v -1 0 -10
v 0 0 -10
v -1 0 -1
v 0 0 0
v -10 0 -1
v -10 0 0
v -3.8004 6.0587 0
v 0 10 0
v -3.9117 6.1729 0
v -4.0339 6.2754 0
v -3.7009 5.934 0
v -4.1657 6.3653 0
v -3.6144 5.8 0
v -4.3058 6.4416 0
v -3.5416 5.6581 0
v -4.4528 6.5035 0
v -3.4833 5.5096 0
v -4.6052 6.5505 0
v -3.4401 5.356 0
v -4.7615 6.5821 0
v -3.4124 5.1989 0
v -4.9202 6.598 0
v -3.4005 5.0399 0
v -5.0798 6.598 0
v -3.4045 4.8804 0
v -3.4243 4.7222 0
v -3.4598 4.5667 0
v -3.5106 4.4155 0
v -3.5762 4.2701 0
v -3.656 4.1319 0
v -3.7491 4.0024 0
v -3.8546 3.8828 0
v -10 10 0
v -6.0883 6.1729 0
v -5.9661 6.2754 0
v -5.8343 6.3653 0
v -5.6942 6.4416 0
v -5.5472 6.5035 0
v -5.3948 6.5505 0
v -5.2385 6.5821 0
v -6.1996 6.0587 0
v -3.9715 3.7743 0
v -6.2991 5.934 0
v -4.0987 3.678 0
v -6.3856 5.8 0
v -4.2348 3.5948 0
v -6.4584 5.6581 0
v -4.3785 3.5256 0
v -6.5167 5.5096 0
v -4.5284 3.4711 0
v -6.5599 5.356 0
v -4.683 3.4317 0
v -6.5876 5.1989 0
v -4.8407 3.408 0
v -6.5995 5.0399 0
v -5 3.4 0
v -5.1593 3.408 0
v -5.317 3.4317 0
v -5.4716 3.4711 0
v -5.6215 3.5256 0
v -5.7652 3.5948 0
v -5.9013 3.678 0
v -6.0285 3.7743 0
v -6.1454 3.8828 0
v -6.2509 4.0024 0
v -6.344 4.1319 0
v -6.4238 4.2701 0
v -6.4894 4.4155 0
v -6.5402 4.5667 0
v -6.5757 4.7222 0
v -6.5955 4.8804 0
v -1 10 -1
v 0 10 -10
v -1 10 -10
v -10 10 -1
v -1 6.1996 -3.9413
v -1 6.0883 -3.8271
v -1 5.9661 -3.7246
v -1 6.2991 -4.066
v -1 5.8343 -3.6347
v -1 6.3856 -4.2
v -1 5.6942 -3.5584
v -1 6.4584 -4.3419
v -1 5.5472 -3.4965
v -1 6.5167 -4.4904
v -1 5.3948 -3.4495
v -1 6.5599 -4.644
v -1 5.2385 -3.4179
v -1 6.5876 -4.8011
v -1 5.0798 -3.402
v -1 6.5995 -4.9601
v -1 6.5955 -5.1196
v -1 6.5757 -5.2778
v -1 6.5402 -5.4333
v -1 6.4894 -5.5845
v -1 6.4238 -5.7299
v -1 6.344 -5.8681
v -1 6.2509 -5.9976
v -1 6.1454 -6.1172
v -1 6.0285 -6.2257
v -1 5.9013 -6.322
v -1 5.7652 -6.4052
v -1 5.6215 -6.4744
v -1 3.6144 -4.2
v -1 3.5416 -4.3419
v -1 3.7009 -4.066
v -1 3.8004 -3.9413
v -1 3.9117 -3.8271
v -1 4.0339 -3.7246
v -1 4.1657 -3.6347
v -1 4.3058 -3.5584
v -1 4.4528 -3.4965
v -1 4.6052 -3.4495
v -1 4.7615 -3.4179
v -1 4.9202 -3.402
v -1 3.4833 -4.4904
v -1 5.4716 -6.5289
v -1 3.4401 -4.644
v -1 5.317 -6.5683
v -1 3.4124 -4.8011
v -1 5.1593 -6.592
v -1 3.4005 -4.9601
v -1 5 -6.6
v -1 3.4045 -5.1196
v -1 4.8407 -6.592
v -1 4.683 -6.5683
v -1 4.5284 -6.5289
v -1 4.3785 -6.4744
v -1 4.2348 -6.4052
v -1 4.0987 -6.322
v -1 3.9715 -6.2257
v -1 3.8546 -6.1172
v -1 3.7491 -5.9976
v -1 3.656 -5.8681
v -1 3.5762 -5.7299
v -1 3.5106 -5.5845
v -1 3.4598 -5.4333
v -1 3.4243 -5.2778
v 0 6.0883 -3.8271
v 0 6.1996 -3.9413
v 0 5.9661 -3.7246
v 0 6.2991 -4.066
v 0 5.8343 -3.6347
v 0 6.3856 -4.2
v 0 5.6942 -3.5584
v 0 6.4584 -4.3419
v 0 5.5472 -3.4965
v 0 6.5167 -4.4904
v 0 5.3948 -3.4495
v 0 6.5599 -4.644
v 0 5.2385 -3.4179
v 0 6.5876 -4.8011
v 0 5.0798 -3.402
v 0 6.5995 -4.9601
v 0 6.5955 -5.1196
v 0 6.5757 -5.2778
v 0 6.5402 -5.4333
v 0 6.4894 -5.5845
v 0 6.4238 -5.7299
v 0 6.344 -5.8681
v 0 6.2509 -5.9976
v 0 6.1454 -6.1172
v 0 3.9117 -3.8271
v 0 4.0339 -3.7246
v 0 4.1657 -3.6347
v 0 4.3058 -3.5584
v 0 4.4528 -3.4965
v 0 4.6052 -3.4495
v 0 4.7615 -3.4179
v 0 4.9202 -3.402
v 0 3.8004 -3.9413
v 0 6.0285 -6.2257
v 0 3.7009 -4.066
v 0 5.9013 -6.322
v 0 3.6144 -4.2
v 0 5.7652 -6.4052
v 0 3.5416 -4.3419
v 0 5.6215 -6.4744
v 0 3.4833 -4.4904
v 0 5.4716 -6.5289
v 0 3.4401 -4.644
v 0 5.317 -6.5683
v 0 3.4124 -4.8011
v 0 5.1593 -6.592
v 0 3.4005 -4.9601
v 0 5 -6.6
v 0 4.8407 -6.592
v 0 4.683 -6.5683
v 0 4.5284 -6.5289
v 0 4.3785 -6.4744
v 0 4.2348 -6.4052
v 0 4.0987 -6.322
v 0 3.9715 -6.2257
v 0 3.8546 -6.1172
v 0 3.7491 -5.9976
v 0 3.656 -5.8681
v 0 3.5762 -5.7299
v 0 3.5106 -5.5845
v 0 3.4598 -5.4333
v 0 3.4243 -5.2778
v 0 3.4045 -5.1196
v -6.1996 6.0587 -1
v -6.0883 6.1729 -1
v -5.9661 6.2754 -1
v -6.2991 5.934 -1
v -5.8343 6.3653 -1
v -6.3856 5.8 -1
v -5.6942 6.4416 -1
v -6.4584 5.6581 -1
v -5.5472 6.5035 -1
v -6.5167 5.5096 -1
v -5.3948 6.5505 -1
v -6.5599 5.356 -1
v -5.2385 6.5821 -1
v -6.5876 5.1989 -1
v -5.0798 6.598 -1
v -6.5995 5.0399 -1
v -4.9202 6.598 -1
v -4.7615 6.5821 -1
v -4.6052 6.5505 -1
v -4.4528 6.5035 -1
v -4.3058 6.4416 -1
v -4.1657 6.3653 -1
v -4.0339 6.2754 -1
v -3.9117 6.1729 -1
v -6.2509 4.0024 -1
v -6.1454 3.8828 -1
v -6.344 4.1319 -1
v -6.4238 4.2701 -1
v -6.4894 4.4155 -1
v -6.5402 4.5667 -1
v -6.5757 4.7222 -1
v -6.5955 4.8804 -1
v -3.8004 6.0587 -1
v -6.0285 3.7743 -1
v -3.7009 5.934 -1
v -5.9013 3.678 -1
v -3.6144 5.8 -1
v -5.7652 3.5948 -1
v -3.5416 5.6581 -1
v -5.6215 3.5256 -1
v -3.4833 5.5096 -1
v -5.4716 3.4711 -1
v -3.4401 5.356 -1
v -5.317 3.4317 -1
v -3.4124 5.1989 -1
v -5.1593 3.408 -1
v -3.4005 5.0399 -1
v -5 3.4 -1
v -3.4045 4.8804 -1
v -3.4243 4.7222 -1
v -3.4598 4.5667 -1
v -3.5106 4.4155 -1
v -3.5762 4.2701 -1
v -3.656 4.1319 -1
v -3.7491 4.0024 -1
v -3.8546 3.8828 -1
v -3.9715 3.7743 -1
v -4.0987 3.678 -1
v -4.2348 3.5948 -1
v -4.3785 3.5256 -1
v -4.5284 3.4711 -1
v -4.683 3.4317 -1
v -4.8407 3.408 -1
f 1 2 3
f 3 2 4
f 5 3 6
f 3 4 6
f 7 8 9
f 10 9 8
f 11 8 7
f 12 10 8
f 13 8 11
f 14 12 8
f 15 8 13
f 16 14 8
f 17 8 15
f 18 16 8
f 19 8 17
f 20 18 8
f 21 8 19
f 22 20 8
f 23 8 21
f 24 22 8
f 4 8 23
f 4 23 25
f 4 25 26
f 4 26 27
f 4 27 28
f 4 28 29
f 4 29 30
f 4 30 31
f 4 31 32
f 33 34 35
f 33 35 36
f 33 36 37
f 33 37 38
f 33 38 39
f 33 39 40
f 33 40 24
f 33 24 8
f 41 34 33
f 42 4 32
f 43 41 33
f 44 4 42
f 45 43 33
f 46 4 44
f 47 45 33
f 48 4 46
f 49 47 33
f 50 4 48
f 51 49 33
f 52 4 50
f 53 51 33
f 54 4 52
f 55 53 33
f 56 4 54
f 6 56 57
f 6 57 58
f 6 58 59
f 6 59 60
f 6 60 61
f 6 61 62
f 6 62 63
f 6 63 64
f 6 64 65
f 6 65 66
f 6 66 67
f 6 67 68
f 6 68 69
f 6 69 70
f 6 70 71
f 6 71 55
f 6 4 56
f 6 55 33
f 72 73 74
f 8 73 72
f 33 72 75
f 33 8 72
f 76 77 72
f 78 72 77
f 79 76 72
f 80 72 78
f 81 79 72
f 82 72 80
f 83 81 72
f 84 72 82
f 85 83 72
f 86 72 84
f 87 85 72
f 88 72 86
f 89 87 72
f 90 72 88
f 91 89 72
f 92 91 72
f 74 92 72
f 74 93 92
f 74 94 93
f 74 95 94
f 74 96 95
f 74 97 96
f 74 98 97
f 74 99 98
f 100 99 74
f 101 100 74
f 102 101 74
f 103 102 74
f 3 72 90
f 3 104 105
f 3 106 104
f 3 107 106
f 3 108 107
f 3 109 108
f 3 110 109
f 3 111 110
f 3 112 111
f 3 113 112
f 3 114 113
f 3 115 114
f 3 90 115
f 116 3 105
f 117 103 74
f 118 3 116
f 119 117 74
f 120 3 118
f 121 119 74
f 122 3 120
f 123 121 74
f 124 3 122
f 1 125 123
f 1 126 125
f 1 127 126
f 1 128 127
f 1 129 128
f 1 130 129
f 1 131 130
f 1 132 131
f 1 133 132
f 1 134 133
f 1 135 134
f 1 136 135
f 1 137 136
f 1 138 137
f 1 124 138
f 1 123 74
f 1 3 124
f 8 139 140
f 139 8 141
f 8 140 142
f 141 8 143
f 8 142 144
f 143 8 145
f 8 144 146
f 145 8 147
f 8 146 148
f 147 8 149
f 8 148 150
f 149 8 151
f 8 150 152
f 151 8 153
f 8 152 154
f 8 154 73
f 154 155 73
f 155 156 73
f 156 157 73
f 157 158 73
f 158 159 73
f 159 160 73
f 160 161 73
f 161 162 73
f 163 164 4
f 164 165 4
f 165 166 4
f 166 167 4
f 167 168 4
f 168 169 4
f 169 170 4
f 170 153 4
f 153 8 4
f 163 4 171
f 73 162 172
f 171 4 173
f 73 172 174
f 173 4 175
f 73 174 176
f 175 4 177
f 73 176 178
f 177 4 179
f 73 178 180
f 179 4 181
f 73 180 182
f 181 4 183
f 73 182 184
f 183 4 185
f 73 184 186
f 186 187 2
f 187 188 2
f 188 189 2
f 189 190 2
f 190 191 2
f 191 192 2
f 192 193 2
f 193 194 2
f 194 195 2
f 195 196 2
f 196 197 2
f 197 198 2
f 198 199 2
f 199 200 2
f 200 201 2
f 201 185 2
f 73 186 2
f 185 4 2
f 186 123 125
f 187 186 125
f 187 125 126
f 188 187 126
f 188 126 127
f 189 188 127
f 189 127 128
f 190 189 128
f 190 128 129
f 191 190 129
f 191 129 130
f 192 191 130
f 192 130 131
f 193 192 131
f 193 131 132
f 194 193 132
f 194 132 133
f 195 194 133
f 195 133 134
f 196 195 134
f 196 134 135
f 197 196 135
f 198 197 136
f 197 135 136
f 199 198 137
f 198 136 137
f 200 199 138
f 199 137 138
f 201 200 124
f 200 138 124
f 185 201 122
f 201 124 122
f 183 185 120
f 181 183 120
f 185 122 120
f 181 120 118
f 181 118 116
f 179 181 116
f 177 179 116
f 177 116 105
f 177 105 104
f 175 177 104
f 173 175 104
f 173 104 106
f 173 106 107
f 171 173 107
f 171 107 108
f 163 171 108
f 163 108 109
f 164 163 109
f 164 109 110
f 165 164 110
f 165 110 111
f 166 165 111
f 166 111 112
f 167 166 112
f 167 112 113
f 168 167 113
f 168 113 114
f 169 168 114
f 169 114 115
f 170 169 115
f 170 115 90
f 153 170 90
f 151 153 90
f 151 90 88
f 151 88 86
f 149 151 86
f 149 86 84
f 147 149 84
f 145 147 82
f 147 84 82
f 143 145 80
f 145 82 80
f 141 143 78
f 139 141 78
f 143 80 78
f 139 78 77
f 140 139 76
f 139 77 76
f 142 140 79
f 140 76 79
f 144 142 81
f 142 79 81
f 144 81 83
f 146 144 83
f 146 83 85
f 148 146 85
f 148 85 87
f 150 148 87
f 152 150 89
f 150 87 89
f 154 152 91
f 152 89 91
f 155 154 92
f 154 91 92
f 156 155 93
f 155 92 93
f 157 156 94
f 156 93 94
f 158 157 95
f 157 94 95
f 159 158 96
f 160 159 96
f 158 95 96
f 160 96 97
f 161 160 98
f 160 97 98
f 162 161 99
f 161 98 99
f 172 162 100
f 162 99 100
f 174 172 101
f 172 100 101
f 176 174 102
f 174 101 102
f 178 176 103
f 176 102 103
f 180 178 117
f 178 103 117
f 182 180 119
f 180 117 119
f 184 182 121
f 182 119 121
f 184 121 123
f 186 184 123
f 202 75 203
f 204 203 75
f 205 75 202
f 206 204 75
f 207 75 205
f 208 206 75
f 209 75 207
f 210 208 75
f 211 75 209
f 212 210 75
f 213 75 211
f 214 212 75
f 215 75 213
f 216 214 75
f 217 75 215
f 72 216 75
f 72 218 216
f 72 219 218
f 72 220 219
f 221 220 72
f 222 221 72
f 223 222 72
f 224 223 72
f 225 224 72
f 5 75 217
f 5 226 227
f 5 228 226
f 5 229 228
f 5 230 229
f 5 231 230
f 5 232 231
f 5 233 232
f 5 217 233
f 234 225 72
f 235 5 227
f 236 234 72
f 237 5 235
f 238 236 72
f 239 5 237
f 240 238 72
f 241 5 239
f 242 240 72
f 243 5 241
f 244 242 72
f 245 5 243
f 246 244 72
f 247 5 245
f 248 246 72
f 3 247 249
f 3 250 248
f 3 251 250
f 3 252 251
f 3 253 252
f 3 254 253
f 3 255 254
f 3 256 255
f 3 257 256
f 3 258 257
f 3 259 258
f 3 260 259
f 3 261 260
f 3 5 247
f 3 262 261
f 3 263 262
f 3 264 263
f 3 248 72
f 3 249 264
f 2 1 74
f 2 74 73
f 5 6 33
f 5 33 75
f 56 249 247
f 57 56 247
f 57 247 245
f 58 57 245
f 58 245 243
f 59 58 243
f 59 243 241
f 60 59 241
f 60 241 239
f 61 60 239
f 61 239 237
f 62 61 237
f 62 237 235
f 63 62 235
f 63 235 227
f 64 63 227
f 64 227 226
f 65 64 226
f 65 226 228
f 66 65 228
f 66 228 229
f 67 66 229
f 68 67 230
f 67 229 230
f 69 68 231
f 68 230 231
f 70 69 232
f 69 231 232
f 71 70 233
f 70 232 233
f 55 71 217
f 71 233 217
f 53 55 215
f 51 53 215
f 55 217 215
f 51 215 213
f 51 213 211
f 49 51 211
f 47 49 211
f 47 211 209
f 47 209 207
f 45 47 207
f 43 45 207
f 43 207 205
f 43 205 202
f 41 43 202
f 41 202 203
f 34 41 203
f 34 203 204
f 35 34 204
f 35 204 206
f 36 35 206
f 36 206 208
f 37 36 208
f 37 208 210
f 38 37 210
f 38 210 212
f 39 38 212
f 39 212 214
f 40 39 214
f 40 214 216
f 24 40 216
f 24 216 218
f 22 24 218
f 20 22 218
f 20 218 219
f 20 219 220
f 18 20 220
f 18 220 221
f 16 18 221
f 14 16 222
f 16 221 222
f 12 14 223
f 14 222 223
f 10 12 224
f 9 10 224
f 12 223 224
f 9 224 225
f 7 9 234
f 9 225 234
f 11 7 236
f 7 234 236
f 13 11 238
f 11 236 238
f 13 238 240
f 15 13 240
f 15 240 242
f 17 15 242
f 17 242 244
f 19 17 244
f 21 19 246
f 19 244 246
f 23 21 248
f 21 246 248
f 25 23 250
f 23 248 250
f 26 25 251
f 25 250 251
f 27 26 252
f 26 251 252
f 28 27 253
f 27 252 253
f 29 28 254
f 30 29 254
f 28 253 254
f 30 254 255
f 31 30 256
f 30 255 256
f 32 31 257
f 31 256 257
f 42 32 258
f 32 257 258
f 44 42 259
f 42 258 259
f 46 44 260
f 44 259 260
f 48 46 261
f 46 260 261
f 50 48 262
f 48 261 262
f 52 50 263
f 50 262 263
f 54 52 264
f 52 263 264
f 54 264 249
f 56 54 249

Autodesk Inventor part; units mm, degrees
ref_plane "YZ Plane" through (0, 0, 0) normal (1, 0, 0) x (0, 1, 0)
ref_plane "XZ Plane" through (0, 0, 0) normal (0, 1, 0) x (-1, 0, 0)
ref_plane "XY Plane" through (0, 0, 0) normal (0, 0, 1) x (1, 0, 0)
sketch "Sketch1" plane through (0, 0, 0) normal (0, 1, 0) x (-1, 0, 0)
  line L0 (0.8918, 0) -> (0, 0)
  line L1 (0, 0) -> (0, -10)
  line L2 (0, 0) -> (10, 0)
  line L3 (10, 0) -> (10, -1)
  line L4 (10, -1) -> (1, -1)
  line L5 (1, -1) -> (1, -10)
  line L6 (1, -10) -> (0, -10)
  dimension "d1" = 10
  dimension "d2" = 10
  dimension "d3" = 1
  dimension "d4" = 9
  dimension "d5" = 9
extrude "Extrusion1" add sketch "Sketch1" along normal blind 10
sketch "Sketch2" plane through (-10, 0, 0) normal (0, 0, 1) x (1, 0, 0)
  line L0 (-6.0649, 5) -> (16.1228, 5) construction
  line L1 (5, 14.125) -> (5, -1.5964) construction
  line L2 (0, 10) -> (10, 10) construction
  line L3 (10, 0) -> (10, 10) construction
  point P0 (5, 10)
  point P1 (10, 5)
  point P2 (5, 5)
hole "Hole1" at (-5, 5, 0) direction (0, 0, -1) diameter 3.2 end through all
sketch "Sketch3" plane through (0, 0, 0) normal (1, 0, 0) x (0, 0, -1)
  line L0 (5, 14.0037) -> (5, -2.6876)
  line L1 (-5.0316, 5) -> (14.0442, 5)
  line L2 (0, 10) -> (10, 10) projected
  line L3 (10, 0) -> (10, 10) projected
  point P0 (0, 0)
  point P1 (5, 10)
  point P2 (10, 5)
  point P3 (5, 5)
hole "Hole2" at (0, 5, -5) direction (-1, 0, 0) diameter 3.2 end through all
properties part number "No Thrd Right Support Farnell1466881"
